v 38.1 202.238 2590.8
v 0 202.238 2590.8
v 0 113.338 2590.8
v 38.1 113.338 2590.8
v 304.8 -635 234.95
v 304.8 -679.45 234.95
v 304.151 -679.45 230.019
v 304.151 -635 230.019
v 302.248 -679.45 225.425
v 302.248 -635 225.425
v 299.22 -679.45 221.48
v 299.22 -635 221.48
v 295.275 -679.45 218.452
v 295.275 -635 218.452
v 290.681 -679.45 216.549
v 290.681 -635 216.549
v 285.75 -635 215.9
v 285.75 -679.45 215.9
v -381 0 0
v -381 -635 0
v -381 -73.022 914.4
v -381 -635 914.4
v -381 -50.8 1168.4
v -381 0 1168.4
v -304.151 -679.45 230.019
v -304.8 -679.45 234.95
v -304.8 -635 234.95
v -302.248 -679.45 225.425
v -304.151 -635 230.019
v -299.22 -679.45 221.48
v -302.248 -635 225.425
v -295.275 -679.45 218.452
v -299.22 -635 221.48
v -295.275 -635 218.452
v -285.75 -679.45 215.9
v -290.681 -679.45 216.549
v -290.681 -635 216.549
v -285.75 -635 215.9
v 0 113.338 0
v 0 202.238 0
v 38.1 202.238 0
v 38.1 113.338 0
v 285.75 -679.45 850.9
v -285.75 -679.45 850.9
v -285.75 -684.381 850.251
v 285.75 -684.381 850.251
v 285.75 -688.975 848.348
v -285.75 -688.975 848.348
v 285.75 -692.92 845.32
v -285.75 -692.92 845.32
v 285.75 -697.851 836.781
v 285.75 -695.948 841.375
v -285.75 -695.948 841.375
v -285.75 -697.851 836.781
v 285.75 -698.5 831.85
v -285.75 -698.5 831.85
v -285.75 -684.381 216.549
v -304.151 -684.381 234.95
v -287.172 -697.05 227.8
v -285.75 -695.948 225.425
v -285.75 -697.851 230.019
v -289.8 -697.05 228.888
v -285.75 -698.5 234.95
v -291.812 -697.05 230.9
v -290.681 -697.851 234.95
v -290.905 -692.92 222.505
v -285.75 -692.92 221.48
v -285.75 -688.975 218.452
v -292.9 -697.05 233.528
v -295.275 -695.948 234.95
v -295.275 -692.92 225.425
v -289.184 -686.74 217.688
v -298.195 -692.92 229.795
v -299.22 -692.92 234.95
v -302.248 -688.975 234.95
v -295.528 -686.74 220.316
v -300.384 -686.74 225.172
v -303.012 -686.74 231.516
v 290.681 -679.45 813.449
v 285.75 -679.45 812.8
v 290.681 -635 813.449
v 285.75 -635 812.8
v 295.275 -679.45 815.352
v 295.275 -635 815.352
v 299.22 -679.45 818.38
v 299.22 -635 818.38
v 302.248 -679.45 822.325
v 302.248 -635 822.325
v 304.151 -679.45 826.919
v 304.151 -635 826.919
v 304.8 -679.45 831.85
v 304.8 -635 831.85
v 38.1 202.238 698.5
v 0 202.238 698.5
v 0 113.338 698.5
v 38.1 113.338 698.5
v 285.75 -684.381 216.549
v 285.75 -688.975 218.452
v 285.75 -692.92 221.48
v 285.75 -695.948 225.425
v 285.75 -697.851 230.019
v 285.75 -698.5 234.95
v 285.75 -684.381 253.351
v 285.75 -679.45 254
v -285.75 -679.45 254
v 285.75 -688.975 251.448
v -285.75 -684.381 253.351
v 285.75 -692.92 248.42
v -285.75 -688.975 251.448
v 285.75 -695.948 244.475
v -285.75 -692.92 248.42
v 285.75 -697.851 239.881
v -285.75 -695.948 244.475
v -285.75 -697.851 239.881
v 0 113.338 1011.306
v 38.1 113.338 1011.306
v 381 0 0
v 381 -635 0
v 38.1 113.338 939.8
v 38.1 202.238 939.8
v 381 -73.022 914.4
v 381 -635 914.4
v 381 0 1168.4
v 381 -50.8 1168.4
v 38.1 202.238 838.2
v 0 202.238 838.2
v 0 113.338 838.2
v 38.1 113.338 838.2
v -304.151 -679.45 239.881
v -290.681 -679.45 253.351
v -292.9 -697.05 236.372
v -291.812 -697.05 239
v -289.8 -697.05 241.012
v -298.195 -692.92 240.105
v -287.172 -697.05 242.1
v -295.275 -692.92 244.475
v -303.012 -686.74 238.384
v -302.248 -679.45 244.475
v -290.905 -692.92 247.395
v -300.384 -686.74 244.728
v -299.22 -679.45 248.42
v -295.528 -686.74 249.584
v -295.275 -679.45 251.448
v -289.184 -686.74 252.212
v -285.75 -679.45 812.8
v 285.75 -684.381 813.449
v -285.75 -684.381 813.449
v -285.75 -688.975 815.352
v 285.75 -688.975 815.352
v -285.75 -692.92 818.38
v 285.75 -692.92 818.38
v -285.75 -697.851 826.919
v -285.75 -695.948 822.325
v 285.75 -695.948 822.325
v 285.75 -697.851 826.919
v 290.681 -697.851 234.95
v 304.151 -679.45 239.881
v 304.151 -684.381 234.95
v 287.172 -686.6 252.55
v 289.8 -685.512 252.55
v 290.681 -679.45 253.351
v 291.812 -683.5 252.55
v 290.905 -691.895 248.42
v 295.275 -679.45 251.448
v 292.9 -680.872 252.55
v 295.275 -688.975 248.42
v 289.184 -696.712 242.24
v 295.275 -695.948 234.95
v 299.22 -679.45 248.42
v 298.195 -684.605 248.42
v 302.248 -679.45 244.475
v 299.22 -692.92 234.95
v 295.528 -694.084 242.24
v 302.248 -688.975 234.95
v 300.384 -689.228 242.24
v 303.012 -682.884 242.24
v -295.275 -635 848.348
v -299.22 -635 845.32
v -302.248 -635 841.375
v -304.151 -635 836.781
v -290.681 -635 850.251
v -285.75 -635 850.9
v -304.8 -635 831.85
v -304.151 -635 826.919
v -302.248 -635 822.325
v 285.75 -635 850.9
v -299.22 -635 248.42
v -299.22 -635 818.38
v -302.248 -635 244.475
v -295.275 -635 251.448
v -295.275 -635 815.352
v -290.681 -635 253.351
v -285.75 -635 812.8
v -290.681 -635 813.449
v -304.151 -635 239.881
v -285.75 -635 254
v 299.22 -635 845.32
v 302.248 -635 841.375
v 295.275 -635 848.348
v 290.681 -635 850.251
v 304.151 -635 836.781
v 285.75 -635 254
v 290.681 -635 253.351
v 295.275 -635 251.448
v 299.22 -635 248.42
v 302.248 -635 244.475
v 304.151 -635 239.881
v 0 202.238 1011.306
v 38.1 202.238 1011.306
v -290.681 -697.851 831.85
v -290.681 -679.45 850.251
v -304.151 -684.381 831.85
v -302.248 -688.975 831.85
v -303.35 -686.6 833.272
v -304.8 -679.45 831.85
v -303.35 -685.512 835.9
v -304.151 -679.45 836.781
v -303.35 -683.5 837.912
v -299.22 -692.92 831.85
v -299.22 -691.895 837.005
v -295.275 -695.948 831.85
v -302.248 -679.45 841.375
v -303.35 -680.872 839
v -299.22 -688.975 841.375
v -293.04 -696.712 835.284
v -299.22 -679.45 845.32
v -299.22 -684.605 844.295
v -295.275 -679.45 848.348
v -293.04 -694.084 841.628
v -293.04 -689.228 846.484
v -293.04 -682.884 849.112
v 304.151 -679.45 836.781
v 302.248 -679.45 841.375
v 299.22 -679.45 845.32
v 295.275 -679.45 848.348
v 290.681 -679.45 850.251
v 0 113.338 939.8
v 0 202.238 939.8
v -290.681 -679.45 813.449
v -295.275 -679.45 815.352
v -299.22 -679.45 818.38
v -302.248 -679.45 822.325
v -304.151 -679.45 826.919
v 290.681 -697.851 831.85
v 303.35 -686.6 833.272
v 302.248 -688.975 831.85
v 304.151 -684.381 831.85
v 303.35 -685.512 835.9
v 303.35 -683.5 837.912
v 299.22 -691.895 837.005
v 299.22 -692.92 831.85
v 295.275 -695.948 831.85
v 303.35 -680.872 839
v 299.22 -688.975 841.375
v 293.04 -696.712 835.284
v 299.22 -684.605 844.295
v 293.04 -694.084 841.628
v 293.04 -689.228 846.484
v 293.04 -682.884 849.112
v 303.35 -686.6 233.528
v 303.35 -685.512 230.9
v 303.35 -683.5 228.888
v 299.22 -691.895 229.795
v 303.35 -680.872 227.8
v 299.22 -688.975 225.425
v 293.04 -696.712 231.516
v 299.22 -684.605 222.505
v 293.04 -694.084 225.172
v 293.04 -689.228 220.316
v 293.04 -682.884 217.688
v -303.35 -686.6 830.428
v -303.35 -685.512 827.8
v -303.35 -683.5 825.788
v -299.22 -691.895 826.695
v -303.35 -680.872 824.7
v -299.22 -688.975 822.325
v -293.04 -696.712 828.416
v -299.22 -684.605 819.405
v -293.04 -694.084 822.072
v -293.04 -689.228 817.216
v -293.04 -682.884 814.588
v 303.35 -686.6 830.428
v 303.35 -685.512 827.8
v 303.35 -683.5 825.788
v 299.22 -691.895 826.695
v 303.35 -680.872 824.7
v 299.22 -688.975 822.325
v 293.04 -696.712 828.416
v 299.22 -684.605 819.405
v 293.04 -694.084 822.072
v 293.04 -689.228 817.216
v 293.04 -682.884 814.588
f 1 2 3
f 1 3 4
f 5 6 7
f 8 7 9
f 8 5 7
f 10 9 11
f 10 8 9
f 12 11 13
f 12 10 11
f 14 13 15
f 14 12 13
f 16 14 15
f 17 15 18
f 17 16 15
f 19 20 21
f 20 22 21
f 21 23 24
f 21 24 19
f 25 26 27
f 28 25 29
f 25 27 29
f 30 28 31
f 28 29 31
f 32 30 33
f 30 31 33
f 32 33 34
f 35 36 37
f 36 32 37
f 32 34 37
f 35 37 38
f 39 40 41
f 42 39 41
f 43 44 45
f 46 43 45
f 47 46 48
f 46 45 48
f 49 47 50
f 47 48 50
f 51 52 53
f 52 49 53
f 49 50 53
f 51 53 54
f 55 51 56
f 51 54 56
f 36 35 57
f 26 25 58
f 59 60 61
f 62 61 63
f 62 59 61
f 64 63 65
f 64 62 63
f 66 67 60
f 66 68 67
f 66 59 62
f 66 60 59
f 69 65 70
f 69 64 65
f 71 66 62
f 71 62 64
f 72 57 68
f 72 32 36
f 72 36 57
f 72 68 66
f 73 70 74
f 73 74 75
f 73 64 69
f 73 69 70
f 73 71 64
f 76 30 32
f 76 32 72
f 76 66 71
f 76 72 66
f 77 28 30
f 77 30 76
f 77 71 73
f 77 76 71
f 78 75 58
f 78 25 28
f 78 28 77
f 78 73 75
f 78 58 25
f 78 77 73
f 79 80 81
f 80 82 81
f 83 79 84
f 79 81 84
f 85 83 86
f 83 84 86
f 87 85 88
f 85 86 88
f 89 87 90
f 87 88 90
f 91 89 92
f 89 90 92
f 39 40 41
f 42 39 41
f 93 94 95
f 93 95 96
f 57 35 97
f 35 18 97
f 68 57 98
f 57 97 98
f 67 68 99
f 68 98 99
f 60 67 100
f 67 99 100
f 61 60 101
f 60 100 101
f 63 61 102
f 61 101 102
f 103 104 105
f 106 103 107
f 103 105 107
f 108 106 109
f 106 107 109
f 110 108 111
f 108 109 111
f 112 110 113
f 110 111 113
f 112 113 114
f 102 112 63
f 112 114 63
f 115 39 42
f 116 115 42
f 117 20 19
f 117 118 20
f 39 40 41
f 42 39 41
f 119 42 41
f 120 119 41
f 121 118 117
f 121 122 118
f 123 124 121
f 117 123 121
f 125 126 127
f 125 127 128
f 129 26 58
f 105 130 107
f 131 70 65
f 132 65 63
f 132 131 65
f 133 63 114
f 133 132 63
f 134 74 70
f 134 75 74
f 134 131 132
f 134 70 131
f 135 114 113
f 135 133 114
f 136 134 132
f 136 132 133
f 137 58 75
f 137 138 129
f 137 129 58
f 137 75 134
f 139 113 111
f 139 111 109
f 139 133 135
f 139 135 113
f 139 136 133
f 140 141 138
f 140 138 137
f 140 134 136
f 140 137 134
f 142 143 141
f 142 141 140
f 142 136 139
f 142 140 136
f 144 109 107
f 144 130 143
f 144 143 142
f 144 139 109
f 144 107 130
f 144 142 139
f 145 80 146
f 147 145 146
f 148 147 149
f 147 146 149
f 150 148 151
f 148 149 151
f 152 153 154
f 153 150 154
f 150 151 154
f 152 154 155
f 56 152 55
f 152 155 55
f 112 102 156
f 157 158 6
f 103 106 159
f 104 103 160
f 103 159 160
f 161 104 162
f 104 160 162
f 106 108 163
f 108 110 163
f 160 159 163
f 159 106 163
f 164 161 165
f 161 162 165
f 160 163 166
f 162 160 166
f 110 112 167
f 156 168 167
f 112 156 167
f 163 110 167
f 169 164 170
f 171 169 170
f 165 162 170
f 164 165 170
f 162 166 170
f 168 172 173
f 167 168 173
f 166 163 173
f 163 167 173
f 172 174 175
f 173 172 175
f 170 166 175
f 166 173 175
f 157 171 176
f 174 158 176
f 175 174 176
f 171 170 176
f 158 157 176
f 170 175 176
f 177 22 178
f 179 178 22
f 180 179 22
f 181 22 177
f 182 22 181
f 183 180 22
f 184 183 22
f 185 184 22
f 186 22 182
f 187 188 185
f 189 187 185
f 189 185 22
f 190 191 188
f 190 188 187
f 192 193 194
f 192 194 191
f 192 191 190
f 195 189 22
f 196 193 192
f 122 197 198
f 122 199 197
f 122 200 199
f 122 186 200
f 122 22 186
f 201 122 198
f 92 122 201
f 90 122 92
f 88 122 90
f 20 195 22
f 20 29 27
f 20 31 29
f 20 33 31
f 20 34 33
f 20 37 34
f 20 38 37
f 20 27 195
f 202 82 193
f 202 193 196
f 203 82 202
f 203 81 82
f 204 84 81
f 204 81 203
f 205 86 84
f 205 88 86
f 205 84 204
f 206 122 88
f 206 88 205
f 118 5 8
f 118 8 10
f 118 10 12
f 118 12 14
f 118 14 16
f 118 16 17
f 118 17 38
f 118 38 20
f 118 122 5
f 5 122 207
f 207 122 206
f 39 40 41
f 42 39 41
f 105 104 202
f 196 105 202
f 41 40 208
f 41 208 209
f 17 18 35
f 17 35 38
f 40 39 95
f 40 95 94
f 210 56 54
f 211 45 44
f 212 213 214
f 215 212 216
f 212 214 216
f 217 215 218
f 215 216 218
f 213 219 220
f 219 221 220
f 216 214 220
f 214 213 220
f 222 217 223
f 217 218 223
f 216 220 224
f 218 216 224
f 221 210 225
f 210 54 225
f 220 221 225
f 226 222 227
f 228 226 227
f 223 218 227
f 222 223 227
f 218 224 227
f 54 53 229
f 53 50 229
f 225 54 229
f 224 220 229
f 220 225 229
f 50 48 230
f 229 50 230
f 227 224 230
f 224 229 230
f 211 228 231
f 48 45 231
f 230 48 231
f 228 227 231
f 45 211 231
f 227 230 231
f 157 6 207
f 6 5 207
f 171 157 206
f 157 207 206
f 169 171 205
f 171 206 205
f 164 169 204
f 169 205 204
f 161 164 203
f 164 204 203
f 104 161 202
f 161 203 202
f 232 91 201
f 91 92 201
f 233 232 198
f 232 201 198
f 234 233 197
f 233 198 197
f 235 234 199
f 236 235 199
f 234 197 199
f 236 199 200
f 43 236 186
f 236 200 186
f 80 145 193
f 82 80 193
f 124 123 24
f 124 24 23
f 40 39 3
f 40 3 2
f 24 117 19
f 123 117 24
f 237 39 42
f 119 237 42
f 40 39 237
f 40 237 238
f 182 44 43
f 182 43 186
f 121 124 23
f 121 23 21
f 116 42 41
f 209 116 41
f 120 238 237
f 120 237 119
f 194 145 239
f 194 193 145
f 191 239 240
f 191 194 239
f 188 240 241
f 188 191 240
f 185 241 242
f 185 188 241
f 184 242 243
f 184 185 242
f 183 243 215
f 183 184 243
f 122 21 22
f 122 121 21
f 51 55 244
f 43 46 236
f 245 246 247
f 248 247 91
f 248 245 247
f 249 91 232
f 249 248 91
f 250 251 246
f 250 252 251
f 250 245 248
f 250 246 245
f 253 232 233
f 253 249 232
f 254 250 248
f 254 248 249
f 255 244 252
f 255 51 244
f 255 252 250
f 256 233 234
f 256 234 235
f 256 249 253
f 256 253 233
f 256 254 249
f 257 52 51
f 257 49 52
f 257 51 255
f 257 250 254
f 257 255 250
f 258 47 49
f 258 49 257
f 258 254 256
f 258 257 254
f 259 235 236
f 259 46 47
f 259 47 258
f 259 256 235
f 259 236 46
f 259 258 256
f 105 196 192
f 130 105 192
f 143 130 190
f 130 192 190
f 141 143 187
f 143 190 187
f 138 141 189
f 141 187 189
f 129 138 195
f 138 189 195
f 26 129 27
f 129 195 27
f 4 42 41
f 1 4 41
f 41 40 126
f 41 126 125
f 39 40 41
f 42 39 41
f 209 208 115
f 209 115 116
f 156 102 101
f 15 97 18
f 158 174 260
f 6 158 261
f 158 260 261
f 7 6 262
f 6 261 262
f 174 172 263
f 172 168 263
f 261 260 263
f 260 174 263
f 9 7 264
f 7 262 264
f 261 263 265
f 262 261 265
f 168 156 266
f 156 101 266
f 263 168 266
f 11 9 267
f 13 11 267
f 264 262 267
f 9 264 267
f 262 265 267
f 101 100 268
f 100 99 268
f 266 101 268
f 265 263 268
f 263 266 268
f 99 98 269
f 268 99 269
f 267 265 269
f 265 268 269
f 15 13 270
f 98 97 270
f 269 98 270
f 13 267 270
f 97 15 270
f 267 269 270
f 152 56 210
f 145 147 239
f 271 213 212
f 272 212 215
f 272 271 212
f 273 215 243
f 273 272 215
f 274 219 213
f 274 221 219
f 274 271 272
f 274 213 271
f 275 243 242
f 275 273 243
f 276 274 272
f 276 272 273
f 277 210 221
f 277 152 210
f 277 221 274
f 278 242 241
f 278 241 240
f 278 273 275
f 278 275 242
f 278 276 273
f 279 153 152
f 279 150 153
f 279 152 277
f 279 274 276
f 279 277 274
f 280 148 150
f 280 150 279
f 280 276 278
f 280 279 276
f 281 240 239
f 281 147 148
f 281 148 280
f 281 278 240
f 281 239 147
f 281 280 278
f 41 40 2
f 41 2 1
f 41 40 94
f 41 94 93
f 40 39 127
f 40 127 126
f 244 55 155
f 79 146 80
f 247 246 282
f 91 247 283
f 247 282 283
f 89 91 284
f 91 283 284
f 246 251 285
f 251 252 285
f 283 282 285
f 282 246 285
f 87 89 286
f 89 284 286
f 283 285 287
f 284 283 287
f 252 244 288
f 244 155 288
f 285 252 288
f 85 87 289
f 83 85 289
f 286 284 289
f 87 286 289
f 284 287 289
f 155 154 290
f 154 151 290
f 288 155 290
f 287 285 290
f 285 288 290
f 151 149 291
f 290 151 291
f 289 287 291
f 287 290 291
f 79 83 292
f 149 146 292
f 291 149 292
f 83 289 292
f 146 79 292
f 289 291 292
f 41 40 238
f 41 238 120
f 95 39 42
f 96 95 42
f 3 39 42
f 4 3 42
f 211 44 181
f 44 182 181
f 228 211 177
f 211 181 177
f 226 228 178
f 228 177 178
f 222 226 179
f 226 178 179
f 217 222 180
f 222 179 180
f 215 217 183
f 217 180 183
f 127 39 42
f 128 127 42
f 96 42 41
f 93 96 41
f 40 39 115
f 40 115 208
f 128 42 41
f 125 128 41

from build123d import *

# Parameters (mm, degrees)
F1_DEPTH  = 381
F2_W      = 63.5
F2_H      = 38.1
F3_DEPTH  = 304.8
F4_R      = 19.04999
F5_W      = 38.1
F5_H      = 88.9
F6_DEPTH  = 838.2
F7_DEPTH  = 2590.8
F8_DEPTH  = 939.8
F9_DEPTH  = 1011.30608
F10_DEPTH = 698.5


# Not quite as in the source:
# - a fillet or chamfer is up to 0.001 mm smaller than in the source, because OpenCascade refuses the exact size


with BuildPart() as f1:
    # F0 (on Right) → F1 (new body, symmetric)
    with BuildSketch(Plane.YZ):
        Polygon((-635, 0), (0, 0), (0, 1168.4), (-50.8, 1168.4), (-73.0221205356, 914.4), (-635, 914.4), align=None)
    extrude(amount=F1_DEPTH, both=True)

    # F2 (on Right) → F3 (join, symmetric)
    with BuildSketch(Plane.YZ):
        with Locations((-666.75, 831.85)):
            Rectangle(F2_W, F2_H)
        with Locations((-666.75, 234.95)):
            Rectangle(F2_W, F2_H)
    extrude(amount=F3_DEPTH, both=True)

    # F4 (radius 19.05 in the source; OpenCascade refuses exactly that, so slightly less here)
    f4_edges = [f1.edges().sort_by_distance(p)[0] for p in [
        (0, -698.5, 850.9),
        (0, -698.5, 812.8),
        (-304.8, -698.5, 831.85),
        (304.8, -698.5, 831.85),
        (304.8, -666.75, 850.9),
        (304.8, -666.75, 812.8),
        (-304.8, -666.75, 850.9),
        (-304.8, -666.75, 812.8),
        (-304.8, -666.75, 254),
        (-304.8, -666.75, 215.9),
        (0, -698.5, 215.9),
        (-304.8, -698.5, 234.95),
        (304.8, -698.5, 234.95),
        (0, -698.5, 254),
        (304.8, -666.75, 254),
        (304.8, -666.75, 215.9),
    ]]
    fillet(f4_edges, radius=F4_R)


with BuildPart() as f6:
    # F5 (on Top) → F6 (new body)
    with BuildSketch(Plane.XY):
        with Locations((19.05, 157.7875594588)):
            Rectangle(F5_W, F5_H)
    extrude(amount=F6_DEPTH)


with BuildPart() as f7:
    # F5 (on Top) → F7 (new body)
    with BuildSketch(Plane.XY):
        with Locations((19.05, 157.7875594588)):
            Rectangle(F5_W, F5_H)
    extrude(amount=F7_DEPTH)


with BuildPart() as f8:
    # F5 (on Top) → F8 (new body)
    with BuildSketch(Plane.XY):
        with Locations((19.05, 157.7875594588)):
            Rectangle(F5_W, F5_H)
    extrude(amount=F8_DEPTH)


with BuildPart() as f9:
    # F5 (on Top) → F9 (new body)
    with BuildSketch(Plane.XY):
        with Locations((19.05, 157.7875594588)):
            Rectangle(F5_W, F5_H)
    extrude(amount=F9_DEPTH)


with BuildPart() as f10:
    # F5 (on Top) → F10 (new body)
    with BuildSketch(Plane.XY):
        with Locations((19.05, 157.7875594588)):
            Rectangle(F5_W, F5_H)
    extrude(amount=F10_DEPTH)


solid = Compound([f1.part, f6.part, f7.part, f8.part, f9.part, f10.part])
